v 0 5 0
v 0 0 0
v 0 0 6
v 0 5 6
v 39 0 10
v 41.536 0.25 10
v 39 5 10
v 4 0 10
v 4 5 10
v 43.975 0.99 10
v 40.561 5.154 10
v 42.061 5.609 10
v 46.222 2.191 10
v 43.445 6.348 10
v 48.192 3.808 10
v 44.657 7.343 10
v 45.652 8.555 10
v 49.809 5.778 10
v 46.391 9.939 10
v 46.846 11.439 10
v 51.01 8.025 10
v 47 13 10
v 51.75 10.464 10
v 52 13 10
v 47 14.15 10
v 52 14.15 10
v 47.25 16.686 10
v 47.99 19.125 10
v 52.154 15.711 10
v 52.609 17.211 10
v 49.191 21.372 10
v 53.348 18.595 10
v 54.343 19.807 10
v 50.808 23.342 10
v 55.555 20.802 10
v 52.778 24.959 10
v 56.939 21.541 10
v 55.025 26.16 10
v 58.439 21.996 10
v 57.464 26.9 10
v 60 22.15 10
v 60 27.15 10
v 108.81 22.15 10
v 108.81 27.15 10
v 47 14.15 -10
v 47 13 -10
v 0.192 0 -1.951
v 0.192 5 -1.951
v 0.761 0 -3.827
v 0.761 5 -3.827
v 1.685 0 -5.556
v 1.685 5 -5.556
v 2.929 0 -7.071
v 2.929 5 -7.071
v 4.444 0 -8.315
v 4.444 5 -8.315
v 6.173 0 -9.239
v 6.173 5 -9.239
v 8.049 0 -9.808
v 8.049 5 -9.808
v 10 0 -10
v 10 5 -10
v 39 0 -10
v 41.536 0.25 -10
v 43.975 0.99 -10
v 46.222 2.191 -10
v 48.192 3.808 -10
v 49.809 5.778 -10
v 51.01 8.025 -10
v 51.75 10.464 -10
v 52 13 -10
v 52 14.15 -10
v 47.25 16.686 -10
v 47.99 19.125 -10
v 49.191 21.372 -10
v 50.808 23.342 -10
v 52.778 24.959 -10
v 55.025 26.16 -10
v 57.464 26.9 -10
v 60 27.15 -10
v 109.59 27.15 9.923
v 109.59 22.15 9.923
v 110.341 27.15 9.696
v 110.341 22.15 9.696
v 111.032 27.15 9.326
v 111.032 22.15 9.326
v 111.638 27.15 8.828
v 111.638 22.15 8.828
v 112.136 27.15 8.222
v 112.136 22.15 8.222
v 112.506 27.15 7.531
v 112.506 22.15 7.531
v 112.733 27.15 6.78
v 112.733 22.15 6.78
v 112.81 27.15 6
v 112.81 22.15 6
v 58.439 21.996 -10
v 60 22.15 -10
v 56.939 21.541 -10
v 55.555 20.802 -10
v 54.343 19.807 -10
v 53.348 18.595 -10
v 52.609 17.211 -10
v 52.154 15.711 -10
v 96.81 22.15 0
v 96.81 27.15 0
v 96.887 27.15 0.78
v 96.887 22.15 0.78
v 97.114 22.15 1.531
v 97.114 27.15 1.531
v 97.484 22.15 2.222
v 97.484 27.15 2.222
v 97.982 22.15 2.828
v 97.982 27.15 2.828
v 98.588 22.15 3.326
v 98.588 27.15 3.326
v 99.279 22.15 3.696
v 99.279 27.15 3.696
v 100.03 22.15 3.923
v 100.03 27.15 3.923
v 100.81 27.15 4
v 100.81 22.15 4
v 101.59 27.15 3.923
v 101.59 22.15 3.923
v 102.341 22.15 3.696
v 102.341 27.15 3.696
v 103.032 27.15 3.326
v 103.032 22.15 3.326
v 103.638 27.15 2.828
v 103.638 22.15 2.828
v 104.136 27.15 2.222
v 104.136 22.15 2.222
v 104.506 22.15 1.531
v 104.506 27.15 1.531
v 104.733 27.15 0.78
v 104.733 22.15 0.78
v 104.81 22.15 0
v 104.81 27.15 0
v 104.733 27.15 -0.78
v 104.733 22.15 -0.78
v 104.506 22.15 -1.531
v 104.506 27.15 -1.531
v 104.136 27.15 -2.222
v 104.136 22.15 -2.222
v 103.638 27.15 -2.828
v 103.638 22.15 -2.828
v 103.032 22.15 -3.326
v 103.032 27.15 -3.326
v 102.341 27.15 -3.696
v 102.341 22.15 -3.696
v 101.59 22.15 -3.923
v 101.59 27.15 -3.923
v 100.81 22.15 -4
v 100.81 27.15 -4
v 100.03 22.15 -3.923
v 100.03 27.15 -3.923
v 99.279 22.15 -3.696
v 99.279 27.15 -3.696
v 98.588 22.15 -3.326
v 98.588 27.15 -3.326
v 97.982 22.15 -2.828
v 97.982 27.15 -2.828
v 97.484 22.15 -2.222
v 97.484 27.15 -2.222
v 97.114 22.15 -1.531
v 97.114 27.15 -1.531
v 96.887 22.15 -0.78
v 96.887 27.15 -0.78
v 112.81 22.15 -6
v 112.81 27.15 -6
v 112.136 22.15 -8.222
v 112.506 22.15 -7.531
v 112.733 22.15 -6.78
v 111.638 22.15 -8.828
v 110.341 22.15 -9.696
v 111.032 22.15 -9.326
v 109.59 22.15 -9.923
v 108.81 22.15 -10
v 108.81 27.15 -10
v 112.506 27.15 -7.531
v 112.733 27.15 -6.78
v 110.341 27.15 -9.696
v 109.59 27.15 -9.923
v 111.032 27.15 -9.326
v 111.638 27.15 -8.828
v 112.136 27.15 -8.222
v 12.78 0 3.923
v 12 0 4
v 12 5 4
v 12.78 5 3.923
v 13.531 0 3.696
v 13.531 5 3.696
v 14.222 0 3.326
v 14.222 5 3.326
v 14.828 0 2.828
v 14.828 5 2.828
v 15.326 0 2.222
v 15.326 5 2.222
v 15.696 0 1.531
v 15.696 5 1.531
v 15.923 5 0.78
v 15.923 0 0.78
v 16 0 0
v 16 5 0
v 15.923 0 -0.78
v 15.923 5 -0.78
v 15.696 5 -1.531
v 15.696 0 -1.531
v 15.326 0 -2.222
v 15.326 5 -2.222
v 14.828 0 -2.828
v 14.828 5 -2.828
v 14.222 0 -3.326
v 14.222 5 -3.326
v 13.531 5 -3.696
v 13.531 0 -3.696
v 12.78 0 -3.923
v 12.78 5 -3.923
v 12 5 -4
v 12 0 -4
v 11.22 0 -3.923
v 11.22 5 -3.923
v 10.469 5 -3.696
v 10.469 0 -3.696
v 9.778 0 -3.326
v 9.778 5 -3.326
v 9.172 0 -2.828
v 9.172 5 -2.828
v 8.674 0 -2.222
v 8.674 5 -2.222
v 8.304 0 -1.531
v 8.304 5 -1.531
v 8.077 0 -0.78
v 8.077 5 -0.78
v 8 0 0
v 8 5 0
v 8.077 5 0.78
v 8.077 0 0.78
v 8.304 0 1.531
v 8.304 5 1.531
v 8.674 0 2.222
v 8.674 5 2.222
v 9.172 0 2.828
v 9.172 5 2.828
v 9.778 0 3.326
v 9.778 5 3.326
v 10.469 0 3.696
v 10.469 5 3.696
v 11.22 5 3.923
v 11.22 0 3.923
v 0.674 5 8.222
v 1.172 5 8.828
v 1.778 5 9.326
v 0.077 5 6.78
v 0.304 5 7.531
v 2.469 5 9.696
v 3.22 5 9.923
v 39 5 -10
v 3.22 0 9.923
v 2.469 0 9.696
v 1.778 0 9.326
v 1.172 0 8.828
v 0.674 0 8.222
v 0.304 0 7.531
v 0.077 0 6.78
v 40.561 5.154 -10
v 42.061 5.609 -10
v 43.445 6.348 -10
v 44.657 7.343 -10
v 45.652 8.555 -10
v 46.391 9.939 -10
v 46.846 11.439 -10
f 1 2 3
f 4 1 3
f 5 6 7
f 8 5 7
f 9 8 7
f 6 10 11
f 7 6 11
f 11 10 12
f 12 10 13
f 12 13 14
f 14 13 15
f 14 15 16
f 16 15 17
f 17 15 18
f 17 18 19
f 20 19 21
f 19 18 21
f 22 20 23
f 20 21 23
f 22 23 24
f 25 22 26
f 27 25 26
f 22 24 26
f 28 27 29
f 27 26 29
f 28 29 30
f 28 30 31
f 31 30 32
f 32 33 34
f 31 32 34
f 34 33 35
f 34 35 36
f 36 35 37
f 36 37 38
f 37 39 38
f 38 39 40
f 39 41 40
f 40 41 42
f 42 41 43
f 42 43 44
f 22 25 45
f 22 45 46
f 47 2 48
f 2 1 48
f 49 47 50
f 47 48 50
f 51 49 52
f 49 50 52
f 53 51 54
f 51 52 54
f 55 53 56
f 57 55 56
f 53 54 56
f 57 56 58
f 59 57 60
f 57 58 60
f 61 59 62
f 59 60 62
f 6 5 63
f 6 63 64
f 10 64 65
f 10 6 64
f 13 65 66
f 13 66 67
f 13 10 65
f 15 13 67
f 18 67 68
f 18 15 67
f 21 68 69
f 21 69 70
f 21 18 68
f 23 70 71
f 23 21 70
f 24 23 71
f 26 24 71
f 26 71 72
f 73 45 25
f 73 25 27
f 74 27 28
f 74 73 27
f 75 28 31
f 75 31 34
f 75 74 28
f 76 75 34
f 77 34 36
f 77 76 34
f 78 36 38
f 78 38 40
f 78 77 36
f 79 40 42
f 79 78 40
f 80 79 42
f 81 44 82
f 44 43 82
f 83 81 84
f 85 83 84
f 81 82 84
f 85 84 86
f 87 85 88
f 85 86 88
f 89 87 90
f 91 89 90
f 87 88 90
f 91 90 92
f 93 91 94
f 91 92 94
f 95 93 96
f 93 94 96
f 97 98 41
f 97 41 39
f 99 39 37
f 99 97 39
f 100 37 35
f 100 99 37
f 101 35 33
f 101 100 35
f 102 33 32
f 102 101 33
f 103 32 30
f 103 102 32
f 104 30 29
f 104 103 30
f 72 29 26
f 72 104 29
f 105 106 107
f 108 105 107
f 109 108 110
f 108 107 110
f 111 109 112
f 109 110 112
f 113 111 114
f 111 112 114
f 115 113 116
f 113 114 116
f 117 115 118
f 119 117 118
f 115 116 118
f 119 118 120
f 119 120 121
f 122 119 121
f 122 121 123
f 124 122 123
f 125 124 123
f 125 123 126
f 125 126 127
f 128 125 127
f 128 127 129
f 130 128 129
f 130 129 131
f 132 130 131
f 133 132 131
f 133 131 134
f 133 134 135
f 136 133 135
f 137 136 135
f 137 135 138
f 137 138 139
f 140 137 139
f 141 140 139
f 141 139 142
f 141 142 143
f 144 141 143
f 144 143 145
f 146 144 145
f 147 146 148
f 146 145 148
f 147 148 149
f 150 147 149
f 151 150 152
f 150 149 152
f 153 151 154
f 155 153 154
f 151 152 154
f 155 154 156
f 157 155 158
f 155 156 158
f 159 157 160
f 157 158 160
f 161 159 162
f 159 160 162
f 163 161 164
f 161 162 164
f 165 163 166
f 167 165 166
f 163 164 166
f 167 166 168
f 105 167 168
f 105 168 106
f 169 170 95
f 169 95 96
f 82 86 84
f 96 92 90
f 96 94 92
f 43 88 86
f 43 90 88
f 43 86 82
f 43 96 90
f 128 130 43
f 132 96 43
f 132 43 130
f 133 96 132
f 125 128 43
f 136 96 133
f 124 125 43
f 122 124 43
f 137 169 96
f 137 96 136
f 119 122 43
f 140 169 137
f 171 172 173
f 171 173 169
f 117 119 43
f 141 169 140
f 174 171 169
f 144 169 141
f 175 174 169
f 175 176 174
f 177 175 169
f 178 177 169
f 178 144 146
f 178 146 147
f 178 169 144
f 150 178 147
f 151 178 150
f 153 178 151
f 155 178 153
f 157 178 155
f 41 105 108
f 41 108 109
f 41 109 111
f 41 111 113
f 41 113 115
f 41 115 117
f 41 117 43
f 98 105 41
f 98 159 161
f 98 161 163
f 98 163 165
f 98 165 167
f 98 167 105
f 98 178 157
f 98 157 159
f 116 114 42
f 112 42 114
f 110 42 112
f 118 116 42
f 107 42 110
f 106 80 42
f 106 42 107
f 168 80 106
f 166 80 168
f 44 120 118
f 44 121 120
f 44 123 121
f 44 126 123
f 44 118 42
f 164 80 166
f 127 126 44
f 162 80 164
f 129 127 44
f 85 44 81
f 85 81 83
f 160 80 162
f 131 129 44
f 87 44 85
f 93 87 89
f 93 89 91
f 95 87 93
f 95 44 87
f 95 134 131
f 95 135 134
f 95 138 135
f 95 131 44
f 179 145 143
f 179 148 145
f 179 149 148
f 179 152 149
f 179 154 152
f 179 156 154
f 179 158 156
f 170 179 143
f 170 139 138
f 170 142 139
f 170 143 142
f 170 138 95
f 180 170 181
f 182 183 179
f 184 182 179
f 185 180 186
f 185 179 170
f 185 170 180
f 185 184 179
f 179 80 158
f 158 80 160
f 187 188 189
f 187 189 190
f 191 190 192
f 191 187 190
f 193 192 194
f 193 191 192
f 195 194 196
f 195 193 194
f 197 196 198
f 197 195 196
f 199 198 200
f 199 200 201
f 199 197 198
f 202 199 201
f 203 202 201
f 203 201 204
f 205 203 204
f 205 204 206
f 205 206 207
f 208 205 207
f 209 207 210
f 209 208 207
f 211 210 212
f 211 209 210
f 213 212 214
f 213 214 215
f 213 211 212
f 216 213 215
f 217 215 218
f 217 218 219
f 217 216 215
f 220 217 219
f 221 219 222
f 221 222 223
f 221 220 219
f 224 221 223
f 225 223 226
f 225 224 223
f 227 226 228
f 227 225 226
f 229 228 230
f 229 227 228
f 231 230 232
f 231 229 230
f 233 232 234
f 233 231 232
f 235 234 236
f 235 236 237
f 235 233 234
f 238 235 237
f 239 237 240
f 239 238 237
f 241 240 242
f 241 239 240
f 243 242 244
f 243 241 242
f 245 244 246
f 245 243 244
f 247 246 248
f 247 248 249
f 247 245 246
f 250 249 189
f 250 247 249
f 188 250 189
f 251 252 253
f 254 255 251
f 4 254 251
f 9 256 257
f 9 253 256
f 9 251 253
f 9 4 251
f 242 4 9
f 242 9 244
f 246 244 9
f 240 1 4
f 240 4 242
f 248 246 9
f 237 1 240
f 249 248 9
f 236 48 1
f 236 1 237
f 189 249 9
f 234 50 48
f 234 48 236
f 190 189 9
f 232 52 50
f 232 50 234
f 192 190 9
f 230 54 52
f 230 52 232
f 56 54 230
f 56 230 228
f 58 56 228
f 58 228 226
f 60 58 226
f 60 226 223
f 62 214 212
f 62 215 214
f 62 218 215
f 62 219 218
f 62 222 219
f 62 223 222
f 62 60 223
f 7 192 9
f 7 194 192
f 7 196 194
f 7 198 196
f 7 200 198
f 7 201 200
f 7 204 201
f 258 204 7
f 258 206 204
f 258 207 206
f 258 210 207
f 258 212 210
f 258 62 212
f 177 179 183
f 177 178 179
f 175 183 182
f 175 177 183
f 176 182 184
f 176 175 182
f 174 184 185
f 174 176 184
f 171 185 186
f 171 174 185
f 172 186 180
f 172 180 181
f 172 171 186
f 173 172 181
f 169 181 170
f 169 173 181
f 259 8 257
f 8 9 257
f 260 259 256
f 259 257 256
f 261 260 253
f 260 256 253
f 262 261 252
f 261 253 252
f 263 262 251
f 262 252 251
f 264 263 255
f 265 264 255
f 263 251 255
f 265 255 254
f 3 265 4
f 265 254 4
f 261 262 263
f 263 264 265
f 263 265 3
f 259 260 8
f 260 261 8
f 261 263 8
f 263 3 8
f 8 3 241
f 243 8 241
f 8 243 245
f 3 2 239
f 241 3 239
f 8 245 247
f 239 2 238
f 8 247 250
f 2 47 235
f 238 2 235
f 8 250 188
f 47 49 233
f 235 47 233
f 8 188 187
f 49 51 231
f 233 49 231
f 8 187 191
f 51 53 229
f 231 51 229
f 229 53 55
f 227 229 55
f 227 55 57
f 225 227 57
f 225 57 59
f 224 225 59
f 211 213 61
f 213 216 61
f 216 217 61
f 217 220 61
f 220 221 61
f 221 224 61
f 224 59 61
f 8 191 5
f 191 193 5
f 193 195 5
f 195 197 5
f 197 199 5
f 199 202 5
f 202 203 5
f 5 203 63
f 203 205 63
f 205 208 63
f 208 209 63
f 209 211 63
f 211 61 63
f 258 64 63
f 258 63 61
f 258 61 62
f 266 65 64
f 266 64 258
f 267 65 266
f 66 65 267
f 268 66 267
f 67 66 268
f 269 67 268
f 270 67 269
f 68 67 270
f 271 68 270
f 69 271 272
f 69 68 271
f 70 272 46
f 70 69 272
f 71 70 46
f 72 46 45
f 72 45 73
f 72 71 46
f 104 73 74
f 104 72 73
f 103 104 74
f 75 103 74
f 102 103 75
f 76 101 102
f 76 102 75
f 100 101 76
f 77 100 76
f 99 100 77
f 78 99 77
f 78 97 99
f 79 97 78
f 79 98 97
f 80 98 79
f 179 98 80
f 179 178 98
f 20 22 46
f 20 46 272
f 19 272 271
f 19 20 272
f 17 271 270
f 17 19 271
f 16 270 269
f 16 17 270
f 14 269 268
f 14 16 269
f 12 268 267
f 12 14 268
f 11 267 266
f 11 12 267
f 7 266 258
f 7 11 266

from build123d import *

# Parameters (mm, degrees)
SKETCH1_R                    = 4
BASE_FLANGE1_DEPTH           = 5
EDGE_FLANGE1_STRIP_W         = 36
EDGE_FLANGE1_STRIP_H         = 5
EDGE_FLANGE1_STRIP_CUT_DEPTH = 20
EDGE_FLANGE1_DEPTH           = 20
EDGE_FLANGE2_STRIP_W         = 36
EDGE_FLANGE2_STRIP_H         = 5
EDGE_FLANGE2_STRIP_CUT_DEPTH = 20
EDGE_FLANGE2_DEPTH           = 20
SKETCH14_R                   = 4
CUT_EXTRUDE1_DEPTH           = 10
FILLET1_R                    = 4
FILLET3_R                    = 4
FILLET4_R                    = 10


# Sheet-metal steps are written as plain solids
with BuildPart() as part:
    # Sketch1 → Base-Flange1 (new body)
    with BuildSketch(Plane(origin=(0, 0, 0), x_dir=(1, 0, 0), z_dir=(0, 1, 0))):
        Polygon((4, 10), (0, 10), (0, 6), (0, -6), (0, -10), (4, -10), (47, -10), (47, 10), align=None)
        with Locations(Location((12, 0, 0), (0, 0, 270))):
            Circle(SKETCH1_R, mode=Mode.SUBTRACT)
    extrude(amount=BASE_FLANGE1_DEPTH)

    # Edge-Flange1 strip (across the edge) → Edge-Flange1 strip cut (cut)
    with BuildSketch(Plane(origin=(47, 5, 10), x_dir=(-1, 0, 0), z_dir=(0, 0, -1))):
        with Locations((-10, -2.5)):
            Rectangle(EDGE_FLANGE1_STRIP_W, EDGE_FLANGE1_STRIP_H)
    extrude(amount=EDGE_FLANGE1_STRIP_CUT_DEPTH, mode=Mode.SUBTRACT)

    # Edge-Flange1 section (across the edge) → Edge-Flange1 (add)
    with BuildSketch(Plane(origin=(47, 5, 10), x_dir=(-1, 0, 0), z_dir=(0, 0, -1))):
        with BuildLine():
            Line((-5, 8), (-5, 17.15))
            Line((-5, 17.15), (0, 17.15))
            Line((0, 17.15), (0, 8))
            ThreePointArc((0, 8), (2.343145751, 2.343145751), (8, 0))
            Line((8, 0), (8, -5))
            ThreePointArc((8, -5), (-1.192388155, -1.192388155), (-5, 8))
        make_face()
    extrude(amount=EDGE_FLANGE1_DEPTH)

    # Edge-Flange2 strip (across the edge) → Edge-Flange2 strip cut (cut)
    with BuildSketch(Plane(origin=(52, 22.15, -10), x_dir=(0, -1, 0), z_dir=(0, 0, 1))):
        with Locations((-10, -2.5)):
            Rectangle(EDGE_FLANGE2_STRIP_W, EDGE_FLANGE2_STRIP_H)
    extrude(amount=EDGE_FLANGE2_STRIP_CUT_DEPTH, mode=Mode.SUBTRACT)

    # Edge-Flange2 section (across the edge) → Edge-Flange2 (add)
    with BuildSketch(Plane(origin=(52, 22.15, -10), x_dir=(0, -1, 0), z_dir=(0, 0, 1))):
        with BuildLine():
            Line((-5, 8), (-5, 60.81))
            Line((-5, 60.81), (0, 60.81))
            Line((0, 60.81), (0, 8))
            ThreePointArc((0, 8), (2.343145751, 2.343145751), (8, 0))
            Line((8, 0), (8, -5))
            ThreePointArc((8, -5), (-1.192388155, -1.192388155), (-5, 8))
        make_face()
    extrude(amount=EDGE_FLANGE2_DEPTH)

    # Sketch14 → Cut-Extrude1 (cut)
    with BuildSketch(Plane(origin=(0, 27.15, 0), x_dir=(1, 0, 0), z_dir=(0, 1, 0))):
        with Locations(Location((100.81, 0, 0), (0, 0, 180))):
            Circle(SKETCH14_R)
    extrude(amount=-CUT_EXTRUDE1_DEPTH, mode=Mode.SUBTRACT)

    # Fillet1
    fillet1_edges = [part.edges().sort_by_distance(p)[0] for p in [
        (112.81, 24.65, -10),
        (112.81, 24.65, 10),
    ]]
    fillet(fillet1_edges, radius=FILLET1_R)

    # Fillet3
    fillet3_edges = [part.edges().sort_by_distance(p)[0] for p in [
        (0, 2.5, 10),
    ]]
    fillet(fillet3_edges, radius=FILLET3_R)

    # Fillet4
    fillet4_edges = [part.edges().sort_by_distance(p)[0] for p in [
        (0, 2.5, -10),
    ]]
    fillet(fillet4_edges, radius=FILLET4_R)


solid = part.part
